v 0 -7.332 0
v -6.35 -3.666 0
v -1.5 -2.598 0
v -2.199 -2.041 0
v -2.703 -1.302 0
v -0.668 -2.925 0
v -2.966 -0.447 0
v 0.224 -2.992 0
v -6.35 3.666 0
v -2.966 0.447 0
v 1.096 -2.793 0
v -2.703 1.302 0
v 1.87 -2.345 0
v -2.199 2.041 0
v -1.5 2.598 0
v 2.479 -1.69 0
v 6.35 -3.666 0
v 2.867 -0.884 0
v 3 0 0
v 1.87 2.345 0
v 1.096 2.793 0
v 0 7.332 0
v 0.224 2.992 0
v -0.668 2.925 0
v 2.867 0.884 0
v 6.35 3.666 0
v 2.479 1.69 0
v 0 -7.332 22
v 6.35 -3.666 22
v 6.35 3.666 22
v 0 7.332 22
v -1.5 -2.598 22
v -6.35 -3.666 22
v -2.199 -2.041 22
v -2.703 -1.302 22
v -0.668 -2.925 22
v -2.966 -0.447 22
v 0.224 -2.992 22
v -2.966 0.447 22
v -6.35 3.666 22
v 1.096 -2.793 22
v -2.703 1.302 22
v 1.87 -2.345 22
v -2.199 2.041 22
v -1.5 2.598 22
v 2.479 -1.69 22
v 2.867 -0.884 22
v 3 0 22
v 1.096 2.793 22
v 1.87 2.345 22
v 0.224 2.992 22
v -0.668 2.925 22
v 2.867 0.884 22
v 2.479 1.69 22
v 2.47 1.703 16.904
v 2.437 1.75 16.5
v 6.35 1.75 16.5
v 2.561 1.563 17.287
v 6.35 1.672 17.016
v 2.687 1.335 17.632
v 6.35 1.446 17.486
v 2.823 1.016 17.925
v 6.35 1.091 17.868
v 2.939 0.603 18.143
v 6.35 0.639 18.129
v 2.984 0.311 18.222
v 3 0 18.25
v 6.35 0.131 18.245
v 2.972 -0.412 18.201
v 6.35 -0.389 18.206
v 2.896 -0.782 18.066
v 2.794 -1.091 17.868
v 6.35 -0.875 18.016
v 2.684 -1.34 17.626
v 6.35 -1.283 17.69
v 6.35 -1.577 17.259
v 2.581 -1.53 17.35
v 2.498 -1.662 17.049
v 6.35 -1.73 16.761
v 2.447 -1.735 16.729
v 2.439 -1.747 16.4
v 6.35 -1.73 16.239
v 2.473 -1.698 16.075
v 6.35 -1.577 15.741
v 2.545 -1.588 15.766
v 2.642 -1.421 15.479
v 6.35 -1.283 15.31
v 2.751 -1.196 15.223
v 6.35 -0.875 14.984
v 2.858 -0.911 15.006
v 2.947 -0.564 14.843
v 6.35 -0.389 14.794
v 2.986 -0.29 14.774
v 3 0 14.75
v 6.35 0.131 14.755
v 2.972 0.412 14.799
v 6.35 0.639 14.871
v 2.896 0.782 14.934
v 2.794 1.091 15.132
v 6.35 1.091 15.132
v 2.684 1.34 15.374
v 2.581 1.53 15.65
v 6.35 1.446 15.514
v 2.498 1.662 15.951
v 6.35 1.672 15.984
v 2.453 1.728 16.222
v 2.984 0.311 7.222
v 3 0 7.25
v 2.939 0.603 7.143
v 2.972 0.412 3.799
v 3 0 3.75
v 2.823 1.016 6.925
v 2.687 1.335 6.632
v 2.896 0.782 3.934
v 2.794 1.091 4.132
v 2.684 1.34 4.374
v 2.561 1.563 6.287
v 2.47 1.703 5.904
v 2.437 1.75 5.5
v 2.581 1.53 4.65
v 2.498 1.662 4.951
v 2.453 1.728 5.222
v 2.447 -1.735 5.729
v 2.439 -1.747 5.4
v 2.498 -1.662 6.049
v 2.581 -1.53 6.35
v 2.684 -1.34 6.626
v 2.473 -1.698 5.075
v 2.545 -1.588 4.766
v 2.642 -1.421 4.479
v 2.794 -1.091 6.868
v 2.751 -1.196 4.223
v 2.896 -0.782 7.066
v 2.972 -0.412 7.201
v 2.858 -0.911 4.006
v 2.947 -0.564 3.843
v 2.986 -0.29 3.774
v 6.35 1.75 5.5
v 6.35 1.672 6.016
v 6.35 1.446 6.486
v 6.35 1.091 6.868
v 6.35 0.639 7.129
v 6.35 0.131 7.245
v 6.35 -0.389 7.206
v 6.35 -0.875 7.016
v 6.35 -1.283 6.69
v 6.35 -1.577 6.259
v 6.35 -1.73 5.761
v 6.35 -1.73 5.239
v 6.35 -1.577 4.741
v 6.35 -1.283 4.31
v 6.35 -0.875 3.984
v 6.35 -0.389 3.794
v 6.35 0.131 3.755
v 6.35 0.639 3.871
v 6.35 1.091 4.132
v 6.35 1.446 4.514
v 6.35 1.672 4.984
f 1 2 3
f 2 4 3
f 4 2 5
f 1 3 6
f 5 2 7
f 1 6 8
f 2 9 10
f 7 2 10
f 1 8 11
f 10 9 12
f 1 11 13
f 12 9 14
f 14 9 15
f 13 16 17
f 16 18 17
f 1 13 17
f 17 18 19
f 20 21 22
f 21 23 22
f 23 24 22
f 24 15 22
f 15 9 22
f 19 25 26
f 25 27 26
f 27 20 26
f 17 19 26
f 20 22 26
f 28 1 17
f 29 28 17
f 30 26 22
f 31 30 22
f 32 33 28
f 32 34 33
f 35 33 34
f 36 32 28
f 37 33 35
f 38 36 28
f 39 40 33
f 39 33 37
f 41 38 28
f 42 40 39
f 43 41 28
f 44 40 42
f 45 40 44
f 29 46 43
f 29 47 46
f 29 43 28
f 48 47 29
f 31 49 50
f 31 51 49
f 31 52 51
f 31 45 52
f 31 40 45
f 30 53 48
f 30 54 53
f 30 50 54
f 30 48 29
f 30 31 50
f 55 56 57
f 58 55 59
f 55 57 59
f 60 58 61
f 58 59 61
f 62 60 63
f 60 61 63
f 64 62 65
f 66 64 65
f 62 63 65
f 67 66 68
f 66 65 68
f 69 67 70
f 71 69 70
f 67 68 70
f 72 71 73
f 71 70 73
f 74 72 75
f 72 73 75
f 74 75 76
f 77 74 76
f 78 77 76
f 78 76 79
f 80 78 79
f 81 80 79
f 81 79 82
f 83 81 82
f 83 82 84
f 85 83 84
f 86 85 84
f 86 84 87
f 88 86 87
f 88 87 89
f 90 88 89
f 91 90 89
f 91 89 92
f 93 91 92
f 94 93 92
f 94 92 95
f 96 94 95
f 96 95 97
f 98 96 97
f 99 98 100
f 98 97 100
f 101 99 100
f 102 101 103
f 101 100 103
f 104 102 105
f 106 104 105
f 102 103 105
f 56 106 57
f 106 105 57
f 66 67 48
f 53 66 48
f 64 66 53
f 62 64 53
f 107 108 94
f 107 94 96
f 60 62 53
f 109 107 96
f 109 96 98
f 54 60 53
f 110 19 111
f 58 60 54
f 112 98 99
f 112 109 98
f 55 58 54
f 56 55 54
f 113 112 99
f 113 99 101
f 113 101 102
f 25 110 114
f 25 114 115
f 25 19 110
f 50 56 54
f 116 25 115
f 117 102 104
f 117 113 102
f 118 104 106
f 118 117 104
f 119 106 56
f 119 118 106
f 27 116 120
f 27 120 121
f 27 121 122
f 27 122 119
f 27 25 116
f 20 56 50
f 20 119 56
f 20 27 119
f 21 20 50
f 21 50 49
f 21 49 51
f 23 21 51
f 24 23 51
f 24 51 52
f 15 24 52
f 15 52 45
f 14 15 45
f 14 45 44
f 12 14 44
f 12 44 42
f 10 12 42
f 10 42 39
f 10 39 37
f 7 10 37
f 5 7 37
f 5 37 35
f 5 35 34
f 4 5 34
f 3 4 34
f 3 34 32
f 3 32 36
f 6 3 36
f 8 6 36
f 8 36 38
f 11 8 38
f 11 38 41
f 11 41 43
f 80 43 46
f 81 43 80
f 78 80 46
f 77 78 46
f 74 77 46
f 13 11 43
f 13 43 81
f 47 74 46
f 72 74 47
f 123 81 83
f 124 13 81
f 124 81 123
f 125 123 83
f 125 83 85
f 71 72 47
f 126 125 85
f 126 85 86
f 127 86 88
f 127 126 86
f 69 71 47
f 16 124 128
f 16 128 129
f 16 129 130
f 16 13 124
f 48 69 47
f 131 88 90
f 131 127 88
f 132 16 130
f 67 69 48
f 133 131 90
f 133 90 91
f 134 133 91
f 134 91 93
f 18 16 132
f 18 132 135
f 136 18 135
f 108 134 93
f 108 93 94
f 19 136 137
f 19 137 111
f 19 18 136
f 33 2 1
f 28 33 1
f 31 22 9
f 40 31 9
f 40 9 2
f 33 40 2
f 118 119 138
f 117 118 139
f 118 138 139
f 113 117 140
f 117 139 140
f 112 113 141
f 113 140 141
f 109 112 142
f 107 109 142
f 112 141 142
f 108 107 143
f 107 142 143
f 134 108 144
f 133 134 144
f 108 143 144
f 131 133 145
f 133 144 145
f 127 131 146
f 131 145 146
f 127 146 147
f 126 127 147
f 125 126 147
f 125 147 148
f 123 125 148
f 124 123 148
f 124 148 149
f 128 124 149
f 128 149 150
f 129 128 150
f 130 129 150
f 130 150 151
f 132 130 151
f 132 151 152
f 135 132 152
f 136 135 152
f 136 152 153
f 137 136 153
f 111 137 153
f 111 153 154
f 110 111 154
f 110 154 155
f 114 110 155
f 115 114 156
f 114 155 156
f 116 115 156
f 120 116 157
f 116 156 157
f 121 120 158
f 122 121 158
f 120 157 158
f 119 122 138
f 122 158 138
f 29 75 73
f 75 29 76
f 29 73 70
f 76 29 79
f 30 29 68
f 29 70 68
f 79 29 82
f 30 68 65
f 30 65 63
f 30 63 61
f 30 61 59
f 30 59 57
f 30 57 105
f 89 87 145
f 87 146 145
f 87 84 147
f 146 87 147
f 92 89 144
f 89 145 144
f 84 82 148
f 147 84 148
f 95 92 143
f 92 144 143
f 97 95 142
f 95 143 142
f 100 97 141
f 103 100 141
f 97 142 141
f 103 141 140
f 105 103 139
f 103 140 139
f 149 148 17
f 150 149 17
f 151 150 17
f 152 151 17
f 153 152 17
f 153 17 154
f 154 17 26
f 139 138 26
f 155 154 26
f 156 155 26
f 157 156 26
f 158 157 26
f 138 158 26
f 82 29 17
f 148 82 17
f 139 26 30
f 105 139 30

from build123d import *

# Parameters (mm, degrees)
ESQUISSE1_R             = 3
BOSS_EXTRU_1_DEPTH      = 22
ESQUISSE3_R             = 1.75
ENL_V_MAT_EXTRU_1_DEPTH = 4.5


with BuildPart() as part:
    # Esquisse1 → Boss.-Extru.1 (new body)
    with BuildSketch(Plane.XY):
        Polygon((0, 7.332348419), (-6.35, 3.666174209), (-6.35, -3.666174209), (0, -7.332348419), (6.35, -3.666174209), (6.35, 3.666174209), align=None)
        Circle(ESQUISSE1_R, mode=Mode.SUBTRACT)
    extrude(amount=BOSS_EXTRU_1_DEPTH)

    # Esquisse3 → Enlèv. mat.-Extru.1 (cut)
    with BuildSketch(Plane(origin=(6.35, 0, 0), x_dir=(0, 0, -1), z_dir=(1, 0, 0))):
        with Locations(Location((-5.5, 0, 0), (0, 0, 90))):
            Circle(ESQUISSE3_R)
        with Locations(Location((-16.5, 0, 0), (0, 0, 90))):
            Circle(ESQUISSE3_R)
    extrude(amount=-ENL_V_MAT_EXTRU_1_DEPTH, mode=Mode.SUBTRACT)


solid = part.part
